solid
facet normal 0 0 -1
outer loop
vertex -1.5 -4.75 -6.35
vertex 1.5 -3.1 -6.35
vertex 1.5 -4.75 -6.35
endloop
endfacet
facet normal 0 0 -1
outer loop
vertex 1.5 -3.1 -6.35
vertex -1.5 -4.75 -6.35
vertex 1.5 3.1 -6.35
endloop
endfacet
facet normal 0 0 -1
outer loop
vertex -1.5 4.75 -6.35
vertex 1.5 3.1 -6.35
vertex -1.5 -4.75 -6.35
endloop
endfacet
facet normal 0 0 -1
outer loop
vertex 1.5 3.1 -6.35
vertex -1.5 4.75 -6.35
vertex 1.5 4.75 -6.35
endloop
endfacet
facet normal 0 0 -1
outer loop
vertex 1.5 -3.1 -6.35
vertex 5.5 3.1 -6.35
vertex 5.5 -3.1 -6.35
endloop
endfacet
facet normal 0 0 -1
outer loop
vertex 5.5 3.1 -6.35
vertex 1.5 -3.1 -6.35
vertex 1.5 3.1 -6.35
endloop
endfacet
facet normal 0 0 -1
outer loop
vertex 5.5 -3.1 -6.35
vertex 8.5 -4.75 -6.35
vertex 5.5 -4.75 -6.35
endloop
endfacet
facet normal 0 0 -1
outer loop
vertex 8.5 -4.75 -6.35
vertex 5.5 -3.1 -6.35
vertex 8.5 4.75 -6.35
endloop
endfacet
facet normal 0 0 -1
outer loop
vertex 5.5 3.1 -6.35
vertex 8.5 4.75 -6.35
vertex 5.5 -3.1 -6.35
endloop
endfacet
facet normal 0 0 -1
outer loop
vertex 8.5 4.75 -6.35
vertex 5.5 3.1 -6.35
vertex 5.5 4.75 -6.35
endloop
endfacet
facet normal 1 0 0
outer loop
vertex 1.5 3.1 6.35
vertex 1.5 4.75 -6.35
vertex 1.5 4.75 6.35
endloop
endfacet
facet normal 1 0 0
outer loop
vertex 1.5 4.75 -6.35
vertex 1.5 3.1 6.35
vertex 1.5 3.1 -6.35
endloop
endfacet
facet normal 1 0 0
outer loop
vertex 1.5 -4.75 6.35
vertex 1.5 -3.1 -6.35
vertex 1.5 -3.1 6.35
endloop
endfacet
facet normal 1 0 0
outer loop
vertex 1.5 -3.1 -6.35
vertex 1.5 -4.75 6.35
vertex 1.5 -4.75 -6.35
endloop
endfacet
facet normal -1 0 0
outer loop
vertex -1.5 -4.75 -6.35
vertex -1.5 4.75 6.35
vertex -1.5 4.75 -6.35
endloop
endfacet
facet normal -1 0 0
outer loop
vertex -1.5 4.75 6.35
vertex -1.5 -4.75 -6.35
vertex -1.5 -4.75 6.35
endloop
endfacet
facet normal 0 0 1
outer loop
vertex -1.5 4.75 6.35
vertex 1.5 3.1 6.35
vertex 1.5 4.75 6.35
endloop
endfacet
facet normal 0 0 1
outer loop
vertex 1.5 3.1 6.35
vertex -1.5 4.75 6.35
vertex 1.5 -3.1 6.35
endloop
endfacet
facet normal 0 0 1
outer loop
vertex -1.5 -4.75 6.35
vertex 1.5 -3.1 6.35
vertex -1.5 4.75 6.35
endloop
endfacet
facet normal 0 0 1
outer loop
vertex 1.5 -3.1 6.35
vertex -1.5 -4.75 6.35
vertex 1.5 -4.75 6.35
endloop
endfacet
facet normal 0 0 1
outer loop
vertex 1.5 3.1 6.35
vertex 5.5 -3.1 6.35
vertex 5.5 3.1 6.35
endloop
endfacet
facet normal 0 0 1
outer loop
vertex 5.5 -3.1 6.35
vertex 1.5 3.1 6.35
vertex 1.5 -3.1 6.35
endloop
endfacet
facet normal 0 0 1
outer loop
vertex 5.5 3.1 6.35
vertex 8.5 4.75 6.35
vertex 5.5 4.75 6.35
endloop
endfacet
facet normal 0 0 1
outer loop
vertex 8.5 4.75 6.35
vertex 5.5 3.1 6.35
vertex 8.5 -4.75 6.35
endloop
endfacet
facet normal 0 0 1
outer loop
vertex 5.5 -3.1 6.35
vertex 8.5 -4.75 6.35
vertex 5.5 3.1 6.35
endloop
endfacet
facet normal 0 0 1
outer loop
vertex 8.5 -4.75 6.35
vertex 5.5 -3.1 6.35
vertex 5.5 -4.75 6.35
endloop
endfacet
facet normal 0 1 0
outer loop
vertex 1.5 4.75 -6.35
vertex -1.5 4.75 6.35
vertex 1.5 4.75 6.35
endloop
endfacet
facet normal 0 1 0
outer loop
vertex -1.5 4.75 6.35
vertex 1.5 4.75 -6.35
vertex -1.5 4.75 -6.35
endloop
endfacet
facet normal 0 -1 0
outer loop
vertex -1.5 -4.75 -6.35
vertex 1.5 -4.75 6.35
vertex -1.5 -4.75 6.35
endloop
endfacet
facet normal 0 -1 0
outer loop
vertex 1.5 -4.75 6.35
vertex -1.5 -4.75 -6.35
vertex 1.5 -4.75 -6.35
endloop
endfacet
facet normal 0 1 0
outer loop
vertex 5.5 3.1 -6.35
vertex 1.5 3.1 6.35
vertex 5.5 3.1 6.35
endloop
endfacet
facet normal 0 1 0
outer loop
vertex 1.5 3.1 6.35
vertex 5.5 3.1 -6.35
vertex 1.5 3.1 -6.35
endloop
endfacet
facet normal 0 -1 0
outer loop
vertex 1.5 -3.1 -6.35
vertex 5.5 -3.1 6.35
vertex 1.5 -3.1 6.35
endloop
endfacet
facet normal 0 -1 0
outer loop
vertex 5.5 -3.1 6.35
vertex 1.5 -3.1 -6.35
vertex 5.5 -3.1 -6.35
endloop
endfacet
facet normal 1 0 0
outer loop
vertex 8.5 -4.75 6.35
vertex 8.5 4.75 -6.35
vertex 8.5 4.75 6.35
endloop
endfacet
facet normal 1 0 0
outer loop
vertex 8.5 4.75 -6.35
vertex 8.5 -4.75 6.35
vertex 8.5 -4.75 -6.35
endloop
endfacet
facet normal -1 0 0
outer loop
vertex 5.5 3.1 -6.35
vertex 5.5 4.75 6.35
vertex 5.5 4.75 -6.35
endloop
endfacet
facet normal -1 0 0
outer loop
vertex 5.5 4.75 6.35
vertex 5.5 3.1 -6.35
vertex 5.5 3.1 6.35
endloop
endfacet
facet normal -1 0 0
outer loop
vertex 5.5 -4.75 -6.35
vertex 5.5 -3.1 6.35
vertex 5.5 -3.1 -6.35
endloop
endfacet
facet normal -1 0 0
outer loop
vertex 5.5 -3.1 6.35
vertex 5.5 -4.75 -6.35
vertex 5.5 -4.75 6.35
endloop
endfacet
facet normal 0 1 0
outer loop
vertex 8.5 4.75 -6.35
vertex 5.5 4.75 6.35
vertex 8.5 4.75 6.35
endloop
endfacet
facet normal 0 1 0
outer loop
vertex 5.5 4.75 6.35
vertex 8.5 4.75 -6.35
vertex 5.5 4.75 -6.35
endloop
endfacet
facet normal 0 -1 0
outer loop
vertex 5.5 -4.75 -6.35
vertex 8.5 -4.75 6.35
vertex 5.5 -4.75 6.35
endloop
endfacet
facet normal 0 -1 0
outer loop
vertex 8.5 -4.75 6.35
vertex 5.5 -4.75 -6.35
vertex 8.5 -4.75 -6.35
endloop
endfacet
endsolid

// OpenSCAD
/*
cylinder(d=104.7, h=25.4, center = true, $fn=1000);
*/
rotate([0, 90, 0])
union() {
cube([12.7, 9.5, 3], center = true);

translate([0, 0, 3.5])
cube([12.7, 6.2, 5], center = true);

translate([0, 0, 7])
cube([12.7, 9.5, 3], center = true);
}
/*
cylinder(d=101.7, h=101.6, center = true, $fn=1000);
*/
